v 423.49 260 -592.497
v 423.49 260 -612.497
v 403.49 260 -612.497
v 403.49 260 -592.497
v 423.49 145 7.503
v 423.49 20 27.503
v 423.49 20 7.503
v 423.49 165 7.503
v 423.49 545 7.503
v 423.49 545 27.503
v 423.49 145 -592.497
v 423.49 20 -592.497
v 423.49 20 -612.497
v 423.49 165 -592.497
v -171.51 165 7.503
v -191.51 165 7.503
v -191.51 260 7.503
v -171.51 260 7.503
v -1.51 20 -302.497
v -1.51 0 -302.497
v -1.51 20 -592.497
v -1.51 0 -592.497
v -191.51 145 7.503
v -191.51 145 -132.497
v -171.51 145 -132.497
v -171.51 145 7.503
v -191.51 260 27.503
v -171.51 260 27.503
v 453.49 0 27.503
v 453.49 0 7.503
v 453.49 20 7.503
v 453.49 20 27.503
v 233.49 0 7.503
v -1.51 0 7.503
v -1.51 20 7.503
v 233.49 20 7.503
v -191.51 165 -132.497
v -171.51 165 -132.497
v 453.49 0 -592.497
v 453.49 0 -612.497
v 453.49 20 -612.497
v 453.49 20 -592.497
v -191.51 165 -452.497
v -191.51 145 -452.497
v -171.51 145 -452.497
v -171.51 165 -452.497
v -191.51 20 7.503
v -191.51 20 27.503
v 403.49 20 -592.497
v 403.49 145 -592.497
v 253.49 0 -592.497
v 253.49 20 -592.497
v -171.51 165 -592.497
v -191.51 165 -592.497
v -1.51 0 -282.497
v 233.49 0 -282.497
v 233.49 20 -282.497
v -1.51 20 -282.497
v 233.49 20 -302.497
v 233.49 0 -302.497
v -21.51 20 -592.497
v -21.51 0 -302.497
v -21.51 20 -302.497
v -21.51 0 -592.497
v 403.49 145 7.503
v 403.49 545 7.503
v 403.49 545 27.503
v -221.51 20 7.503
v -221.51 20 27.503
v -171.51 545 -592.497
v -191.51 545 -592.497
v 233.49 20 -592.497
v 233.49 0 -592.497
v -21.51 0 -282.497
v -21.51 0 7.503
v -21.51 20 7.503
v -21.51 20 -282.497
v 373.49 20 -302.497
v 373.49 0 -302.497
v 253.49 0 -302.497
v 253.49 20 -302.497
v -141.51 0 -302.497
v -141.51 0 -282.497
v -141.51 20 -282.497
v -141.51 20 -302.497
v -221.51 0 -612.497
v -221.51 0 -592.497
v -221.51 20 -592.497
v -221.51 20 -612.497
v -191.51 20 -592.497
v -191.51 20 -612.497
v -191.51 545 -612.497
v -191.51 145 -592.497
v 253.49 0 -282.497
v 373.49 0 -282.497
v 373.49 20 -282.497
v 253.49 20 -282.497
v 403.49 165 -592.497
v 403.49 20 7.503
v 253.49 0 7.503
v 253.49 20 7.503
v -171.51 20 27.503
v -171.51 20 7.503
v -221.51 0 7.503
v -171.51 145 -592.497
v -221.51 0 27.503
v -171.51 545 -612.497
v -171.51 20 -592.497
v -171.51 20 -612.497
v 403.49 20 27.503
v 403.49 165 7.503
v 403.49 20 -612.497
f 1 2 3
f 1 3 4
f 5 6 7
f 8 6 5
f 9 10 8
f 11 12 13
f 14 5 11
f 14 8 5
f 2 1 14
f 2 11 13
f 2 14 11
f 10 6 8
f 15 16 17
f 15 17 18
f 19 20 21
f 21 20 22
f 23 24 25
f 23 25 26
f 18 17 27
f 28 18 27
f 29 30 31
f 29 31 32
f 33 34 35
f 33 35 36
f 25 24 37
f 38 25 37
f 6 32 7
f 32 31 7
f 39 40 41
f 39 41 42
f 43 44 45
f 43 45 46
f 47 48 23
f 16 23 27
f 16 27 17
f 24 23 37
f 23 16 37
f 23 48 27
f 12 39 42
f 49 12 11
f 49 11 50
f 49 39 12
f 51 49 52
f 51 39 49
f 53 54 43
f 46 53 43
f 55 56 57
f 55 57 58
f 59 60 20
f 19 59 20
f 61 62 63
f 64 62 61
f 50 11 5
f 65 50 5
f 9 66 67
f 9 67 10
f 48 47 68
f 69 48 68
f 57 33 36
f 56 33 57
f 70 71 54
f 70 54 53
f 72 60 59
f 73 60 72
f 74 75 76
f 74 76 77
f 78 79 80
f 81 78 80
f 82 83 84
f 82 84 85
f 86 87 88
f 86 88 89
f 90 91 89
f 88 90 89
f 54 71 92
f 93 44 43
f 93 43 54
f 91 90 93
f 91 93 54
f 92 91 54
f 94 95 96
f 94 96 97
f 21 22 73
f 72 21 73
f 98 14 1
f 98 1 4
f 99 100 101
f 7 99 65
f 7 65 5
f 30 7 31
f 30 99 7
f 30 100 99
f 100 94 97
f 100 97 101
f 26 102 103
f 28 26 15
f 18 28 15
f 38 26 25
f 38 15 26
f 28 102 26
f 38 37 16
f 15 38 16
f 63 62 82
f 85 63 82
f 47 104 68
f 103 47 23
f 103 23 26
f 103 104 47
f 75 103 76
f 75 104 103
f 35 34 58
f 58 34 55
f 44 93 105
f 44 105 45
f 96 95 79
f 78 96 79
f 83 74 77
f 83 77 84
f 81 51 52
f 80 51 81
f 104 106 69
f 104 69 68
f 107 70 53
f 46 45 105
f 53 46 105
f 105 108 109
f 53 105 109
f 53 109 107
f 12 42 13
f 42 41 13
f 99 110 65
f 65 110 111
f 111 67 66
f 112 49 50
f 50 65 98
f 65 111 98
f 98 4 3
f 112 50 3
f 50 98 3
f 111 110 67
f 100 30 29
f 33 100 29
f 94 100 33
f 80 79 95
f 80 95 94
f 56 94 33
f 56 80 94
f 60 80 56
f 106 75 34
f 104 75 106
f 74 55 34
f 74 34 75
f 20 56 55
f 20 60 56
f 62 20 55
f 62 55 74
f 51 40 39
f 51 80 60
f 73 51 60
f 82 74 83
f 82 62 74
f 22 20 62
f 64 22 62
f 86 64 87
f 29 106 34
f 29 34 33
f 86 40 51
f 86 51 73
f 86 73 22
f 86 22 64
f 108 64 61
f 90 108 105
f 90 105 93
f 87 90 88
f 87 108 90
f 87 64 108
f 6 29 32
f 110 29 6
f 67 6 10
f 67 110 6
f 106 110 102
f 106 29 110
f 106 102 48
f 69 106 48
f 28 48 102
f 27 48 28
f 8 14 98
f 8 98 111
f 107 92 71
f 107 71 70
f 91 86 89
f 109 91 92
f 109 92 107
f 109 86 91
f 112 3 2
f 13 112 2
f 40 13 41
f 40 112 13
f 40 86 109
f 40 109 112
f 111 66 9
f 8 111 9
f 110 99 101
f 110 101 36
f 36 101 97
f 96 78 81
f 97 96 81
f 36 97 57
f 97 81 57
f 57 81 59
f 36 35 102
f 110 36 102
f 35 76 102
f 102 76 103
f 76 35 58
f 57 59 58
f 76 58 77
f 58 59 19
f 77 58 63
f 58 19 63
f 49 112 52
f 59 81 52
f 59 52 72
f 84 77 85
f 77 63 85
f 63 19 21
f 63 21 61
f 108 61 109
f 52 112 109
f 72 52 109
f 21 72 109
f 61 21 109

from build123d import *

# Parameters (mm, degrees)
SKETCH_1_W          = 235
SKETCH_1_H          = 600
EXTRUDE_1_DEPTH     = 20
EXTRUDE_4_DEPTH     = 20
SKETCH_6_W          = 640
SKETCH_6_H          = 20
EXTRUDE_6_DEPTH     = 20
SKETCH1_W           = 320
SKETCH1_H           = 20
CUT_EXTRUDE1_DEPTH  = 20
SKETCH2_W           = 515
SKETCH2_H           = 20
EXTRUDE1_DEPTH      = 20
SKETCH3_W           = 20
SKETCH3_H           = 20
BOSS_EXTRUDE1_DEPTH = 285


with BuildPart() as part:
    # 草图1 → 凸台-拉伸1 (new body)
    with BuildSketch(Plane(origin=(0, 0, 0), x_dir=(1, 0, 0), z_dir=(0, 1, 0))):
        Polygon((-221.510078765, -7.502951786), (-21.510078765, -7.502951786), (-21.510078765, 592.497048214), (-221.510078765, 592.497048214), (-221.510078765, 612.497048214), (453.489921235, 612.497048214), (453.489921235, 592.497048214), (253.489921235, 592.497048214), (253.489921235, -7.502951786), (453.489921235, -7.502951786), (453.489921235, -27.502951786), (-221.510078765, -27.502951786), align=None)
        with Locations((115.989921235, 292.497048214)):
            Rectangle(SKETCH_1_W, SKETCH_1_H, mode=Mode.SUBTRACT)
    extrude(amount=EXTRUDE_1_DEPTH)

    # 草图2 → 凸台-拉伸4 (add)
    with BuildSketch(Plane.ZY.offset(191.510078765)):
        Polygon((27.502951786, 20), (7.502951786, 20), (7.502951786, 165), (7.502951786, 260), (27.502951786, 260), align=None)
        Polygon((-592.497048214, 260), (-592.497048214, 165), (-592.497048214, 20), (-612.497048214, 20), (-612.497048214, 260), align=None)
    extrude_4 = extrude(amount=-EXTRUDE_4_DEPTH)

    # 镜向3: 凸台-拉伸4 across plane
    add(extrude_4.mirror(Plane(origin=(115.989921235, 0, 0), x_dir=(0, 0, 1), z_dir=(1, 0, 0))))

    # 草图6 → 凸台-拉伸6 (add)
    with BuildSketch(Plane.ZY.offset(191.510078765)):
        with Locations((-292.497048214, 155)):
            Rectangle(SKETCH_6_W, SKETCH_6_H)
    extrude_6 = extrude(amount=-EXTRUDE_6_DEPTH)

    # 镜向6: 凸台-拉伸6 across plane
    add(extrude_6.mirror(Plane(origin=(115.989921235, 0, 0), x_dir=(0, 0, 1), z_dir=(1, 0, 0))))

    # Sketch1 → Cut-Extrude1 (cut)
    with BuildSketch(Plane.ZY.offset(191.510078765)):
        with Locations((-292.497048214, 155)):
            Rectangle(SKETCH1_W, SKETCH1_H)
    extrude(amount=-CUT_EXTRUDE1_DEPTH, mode=Mode.SUBTRACT)

    # Sketch2 → Extrude1 (add)
    with BuildSketch(Plane(origin=(0, 0, 0), x_dir=(-1, 0, 0), z_dir=(0, -1, 0))):
        with Locations((-115.989921235, 292.497048214)):
            Rectangle(SKETCH2_W, SKETCH2_H)
    extrude(amount=-EXTRUDE1_DEPTH)

    # Sketch3 → Boss-Extrude1 (add)
    with BuildSketch(Plane(origin=(0, 260, 0), x_dir=(1, 0, 0), z_dir=(0, 1, 0))):
        with Locations((-181.510078765, 602.497048214)):
            Rectangle(SKETCH3_W, SKETCH3_H)
        with Locations((413.489921235, -17.502951786)):
            Rectangle(SKETCH3_W, SKETCH3_H)
    extrude(amount=BOSS_EXTRUDE1_DEPTH)


solid = part.part
